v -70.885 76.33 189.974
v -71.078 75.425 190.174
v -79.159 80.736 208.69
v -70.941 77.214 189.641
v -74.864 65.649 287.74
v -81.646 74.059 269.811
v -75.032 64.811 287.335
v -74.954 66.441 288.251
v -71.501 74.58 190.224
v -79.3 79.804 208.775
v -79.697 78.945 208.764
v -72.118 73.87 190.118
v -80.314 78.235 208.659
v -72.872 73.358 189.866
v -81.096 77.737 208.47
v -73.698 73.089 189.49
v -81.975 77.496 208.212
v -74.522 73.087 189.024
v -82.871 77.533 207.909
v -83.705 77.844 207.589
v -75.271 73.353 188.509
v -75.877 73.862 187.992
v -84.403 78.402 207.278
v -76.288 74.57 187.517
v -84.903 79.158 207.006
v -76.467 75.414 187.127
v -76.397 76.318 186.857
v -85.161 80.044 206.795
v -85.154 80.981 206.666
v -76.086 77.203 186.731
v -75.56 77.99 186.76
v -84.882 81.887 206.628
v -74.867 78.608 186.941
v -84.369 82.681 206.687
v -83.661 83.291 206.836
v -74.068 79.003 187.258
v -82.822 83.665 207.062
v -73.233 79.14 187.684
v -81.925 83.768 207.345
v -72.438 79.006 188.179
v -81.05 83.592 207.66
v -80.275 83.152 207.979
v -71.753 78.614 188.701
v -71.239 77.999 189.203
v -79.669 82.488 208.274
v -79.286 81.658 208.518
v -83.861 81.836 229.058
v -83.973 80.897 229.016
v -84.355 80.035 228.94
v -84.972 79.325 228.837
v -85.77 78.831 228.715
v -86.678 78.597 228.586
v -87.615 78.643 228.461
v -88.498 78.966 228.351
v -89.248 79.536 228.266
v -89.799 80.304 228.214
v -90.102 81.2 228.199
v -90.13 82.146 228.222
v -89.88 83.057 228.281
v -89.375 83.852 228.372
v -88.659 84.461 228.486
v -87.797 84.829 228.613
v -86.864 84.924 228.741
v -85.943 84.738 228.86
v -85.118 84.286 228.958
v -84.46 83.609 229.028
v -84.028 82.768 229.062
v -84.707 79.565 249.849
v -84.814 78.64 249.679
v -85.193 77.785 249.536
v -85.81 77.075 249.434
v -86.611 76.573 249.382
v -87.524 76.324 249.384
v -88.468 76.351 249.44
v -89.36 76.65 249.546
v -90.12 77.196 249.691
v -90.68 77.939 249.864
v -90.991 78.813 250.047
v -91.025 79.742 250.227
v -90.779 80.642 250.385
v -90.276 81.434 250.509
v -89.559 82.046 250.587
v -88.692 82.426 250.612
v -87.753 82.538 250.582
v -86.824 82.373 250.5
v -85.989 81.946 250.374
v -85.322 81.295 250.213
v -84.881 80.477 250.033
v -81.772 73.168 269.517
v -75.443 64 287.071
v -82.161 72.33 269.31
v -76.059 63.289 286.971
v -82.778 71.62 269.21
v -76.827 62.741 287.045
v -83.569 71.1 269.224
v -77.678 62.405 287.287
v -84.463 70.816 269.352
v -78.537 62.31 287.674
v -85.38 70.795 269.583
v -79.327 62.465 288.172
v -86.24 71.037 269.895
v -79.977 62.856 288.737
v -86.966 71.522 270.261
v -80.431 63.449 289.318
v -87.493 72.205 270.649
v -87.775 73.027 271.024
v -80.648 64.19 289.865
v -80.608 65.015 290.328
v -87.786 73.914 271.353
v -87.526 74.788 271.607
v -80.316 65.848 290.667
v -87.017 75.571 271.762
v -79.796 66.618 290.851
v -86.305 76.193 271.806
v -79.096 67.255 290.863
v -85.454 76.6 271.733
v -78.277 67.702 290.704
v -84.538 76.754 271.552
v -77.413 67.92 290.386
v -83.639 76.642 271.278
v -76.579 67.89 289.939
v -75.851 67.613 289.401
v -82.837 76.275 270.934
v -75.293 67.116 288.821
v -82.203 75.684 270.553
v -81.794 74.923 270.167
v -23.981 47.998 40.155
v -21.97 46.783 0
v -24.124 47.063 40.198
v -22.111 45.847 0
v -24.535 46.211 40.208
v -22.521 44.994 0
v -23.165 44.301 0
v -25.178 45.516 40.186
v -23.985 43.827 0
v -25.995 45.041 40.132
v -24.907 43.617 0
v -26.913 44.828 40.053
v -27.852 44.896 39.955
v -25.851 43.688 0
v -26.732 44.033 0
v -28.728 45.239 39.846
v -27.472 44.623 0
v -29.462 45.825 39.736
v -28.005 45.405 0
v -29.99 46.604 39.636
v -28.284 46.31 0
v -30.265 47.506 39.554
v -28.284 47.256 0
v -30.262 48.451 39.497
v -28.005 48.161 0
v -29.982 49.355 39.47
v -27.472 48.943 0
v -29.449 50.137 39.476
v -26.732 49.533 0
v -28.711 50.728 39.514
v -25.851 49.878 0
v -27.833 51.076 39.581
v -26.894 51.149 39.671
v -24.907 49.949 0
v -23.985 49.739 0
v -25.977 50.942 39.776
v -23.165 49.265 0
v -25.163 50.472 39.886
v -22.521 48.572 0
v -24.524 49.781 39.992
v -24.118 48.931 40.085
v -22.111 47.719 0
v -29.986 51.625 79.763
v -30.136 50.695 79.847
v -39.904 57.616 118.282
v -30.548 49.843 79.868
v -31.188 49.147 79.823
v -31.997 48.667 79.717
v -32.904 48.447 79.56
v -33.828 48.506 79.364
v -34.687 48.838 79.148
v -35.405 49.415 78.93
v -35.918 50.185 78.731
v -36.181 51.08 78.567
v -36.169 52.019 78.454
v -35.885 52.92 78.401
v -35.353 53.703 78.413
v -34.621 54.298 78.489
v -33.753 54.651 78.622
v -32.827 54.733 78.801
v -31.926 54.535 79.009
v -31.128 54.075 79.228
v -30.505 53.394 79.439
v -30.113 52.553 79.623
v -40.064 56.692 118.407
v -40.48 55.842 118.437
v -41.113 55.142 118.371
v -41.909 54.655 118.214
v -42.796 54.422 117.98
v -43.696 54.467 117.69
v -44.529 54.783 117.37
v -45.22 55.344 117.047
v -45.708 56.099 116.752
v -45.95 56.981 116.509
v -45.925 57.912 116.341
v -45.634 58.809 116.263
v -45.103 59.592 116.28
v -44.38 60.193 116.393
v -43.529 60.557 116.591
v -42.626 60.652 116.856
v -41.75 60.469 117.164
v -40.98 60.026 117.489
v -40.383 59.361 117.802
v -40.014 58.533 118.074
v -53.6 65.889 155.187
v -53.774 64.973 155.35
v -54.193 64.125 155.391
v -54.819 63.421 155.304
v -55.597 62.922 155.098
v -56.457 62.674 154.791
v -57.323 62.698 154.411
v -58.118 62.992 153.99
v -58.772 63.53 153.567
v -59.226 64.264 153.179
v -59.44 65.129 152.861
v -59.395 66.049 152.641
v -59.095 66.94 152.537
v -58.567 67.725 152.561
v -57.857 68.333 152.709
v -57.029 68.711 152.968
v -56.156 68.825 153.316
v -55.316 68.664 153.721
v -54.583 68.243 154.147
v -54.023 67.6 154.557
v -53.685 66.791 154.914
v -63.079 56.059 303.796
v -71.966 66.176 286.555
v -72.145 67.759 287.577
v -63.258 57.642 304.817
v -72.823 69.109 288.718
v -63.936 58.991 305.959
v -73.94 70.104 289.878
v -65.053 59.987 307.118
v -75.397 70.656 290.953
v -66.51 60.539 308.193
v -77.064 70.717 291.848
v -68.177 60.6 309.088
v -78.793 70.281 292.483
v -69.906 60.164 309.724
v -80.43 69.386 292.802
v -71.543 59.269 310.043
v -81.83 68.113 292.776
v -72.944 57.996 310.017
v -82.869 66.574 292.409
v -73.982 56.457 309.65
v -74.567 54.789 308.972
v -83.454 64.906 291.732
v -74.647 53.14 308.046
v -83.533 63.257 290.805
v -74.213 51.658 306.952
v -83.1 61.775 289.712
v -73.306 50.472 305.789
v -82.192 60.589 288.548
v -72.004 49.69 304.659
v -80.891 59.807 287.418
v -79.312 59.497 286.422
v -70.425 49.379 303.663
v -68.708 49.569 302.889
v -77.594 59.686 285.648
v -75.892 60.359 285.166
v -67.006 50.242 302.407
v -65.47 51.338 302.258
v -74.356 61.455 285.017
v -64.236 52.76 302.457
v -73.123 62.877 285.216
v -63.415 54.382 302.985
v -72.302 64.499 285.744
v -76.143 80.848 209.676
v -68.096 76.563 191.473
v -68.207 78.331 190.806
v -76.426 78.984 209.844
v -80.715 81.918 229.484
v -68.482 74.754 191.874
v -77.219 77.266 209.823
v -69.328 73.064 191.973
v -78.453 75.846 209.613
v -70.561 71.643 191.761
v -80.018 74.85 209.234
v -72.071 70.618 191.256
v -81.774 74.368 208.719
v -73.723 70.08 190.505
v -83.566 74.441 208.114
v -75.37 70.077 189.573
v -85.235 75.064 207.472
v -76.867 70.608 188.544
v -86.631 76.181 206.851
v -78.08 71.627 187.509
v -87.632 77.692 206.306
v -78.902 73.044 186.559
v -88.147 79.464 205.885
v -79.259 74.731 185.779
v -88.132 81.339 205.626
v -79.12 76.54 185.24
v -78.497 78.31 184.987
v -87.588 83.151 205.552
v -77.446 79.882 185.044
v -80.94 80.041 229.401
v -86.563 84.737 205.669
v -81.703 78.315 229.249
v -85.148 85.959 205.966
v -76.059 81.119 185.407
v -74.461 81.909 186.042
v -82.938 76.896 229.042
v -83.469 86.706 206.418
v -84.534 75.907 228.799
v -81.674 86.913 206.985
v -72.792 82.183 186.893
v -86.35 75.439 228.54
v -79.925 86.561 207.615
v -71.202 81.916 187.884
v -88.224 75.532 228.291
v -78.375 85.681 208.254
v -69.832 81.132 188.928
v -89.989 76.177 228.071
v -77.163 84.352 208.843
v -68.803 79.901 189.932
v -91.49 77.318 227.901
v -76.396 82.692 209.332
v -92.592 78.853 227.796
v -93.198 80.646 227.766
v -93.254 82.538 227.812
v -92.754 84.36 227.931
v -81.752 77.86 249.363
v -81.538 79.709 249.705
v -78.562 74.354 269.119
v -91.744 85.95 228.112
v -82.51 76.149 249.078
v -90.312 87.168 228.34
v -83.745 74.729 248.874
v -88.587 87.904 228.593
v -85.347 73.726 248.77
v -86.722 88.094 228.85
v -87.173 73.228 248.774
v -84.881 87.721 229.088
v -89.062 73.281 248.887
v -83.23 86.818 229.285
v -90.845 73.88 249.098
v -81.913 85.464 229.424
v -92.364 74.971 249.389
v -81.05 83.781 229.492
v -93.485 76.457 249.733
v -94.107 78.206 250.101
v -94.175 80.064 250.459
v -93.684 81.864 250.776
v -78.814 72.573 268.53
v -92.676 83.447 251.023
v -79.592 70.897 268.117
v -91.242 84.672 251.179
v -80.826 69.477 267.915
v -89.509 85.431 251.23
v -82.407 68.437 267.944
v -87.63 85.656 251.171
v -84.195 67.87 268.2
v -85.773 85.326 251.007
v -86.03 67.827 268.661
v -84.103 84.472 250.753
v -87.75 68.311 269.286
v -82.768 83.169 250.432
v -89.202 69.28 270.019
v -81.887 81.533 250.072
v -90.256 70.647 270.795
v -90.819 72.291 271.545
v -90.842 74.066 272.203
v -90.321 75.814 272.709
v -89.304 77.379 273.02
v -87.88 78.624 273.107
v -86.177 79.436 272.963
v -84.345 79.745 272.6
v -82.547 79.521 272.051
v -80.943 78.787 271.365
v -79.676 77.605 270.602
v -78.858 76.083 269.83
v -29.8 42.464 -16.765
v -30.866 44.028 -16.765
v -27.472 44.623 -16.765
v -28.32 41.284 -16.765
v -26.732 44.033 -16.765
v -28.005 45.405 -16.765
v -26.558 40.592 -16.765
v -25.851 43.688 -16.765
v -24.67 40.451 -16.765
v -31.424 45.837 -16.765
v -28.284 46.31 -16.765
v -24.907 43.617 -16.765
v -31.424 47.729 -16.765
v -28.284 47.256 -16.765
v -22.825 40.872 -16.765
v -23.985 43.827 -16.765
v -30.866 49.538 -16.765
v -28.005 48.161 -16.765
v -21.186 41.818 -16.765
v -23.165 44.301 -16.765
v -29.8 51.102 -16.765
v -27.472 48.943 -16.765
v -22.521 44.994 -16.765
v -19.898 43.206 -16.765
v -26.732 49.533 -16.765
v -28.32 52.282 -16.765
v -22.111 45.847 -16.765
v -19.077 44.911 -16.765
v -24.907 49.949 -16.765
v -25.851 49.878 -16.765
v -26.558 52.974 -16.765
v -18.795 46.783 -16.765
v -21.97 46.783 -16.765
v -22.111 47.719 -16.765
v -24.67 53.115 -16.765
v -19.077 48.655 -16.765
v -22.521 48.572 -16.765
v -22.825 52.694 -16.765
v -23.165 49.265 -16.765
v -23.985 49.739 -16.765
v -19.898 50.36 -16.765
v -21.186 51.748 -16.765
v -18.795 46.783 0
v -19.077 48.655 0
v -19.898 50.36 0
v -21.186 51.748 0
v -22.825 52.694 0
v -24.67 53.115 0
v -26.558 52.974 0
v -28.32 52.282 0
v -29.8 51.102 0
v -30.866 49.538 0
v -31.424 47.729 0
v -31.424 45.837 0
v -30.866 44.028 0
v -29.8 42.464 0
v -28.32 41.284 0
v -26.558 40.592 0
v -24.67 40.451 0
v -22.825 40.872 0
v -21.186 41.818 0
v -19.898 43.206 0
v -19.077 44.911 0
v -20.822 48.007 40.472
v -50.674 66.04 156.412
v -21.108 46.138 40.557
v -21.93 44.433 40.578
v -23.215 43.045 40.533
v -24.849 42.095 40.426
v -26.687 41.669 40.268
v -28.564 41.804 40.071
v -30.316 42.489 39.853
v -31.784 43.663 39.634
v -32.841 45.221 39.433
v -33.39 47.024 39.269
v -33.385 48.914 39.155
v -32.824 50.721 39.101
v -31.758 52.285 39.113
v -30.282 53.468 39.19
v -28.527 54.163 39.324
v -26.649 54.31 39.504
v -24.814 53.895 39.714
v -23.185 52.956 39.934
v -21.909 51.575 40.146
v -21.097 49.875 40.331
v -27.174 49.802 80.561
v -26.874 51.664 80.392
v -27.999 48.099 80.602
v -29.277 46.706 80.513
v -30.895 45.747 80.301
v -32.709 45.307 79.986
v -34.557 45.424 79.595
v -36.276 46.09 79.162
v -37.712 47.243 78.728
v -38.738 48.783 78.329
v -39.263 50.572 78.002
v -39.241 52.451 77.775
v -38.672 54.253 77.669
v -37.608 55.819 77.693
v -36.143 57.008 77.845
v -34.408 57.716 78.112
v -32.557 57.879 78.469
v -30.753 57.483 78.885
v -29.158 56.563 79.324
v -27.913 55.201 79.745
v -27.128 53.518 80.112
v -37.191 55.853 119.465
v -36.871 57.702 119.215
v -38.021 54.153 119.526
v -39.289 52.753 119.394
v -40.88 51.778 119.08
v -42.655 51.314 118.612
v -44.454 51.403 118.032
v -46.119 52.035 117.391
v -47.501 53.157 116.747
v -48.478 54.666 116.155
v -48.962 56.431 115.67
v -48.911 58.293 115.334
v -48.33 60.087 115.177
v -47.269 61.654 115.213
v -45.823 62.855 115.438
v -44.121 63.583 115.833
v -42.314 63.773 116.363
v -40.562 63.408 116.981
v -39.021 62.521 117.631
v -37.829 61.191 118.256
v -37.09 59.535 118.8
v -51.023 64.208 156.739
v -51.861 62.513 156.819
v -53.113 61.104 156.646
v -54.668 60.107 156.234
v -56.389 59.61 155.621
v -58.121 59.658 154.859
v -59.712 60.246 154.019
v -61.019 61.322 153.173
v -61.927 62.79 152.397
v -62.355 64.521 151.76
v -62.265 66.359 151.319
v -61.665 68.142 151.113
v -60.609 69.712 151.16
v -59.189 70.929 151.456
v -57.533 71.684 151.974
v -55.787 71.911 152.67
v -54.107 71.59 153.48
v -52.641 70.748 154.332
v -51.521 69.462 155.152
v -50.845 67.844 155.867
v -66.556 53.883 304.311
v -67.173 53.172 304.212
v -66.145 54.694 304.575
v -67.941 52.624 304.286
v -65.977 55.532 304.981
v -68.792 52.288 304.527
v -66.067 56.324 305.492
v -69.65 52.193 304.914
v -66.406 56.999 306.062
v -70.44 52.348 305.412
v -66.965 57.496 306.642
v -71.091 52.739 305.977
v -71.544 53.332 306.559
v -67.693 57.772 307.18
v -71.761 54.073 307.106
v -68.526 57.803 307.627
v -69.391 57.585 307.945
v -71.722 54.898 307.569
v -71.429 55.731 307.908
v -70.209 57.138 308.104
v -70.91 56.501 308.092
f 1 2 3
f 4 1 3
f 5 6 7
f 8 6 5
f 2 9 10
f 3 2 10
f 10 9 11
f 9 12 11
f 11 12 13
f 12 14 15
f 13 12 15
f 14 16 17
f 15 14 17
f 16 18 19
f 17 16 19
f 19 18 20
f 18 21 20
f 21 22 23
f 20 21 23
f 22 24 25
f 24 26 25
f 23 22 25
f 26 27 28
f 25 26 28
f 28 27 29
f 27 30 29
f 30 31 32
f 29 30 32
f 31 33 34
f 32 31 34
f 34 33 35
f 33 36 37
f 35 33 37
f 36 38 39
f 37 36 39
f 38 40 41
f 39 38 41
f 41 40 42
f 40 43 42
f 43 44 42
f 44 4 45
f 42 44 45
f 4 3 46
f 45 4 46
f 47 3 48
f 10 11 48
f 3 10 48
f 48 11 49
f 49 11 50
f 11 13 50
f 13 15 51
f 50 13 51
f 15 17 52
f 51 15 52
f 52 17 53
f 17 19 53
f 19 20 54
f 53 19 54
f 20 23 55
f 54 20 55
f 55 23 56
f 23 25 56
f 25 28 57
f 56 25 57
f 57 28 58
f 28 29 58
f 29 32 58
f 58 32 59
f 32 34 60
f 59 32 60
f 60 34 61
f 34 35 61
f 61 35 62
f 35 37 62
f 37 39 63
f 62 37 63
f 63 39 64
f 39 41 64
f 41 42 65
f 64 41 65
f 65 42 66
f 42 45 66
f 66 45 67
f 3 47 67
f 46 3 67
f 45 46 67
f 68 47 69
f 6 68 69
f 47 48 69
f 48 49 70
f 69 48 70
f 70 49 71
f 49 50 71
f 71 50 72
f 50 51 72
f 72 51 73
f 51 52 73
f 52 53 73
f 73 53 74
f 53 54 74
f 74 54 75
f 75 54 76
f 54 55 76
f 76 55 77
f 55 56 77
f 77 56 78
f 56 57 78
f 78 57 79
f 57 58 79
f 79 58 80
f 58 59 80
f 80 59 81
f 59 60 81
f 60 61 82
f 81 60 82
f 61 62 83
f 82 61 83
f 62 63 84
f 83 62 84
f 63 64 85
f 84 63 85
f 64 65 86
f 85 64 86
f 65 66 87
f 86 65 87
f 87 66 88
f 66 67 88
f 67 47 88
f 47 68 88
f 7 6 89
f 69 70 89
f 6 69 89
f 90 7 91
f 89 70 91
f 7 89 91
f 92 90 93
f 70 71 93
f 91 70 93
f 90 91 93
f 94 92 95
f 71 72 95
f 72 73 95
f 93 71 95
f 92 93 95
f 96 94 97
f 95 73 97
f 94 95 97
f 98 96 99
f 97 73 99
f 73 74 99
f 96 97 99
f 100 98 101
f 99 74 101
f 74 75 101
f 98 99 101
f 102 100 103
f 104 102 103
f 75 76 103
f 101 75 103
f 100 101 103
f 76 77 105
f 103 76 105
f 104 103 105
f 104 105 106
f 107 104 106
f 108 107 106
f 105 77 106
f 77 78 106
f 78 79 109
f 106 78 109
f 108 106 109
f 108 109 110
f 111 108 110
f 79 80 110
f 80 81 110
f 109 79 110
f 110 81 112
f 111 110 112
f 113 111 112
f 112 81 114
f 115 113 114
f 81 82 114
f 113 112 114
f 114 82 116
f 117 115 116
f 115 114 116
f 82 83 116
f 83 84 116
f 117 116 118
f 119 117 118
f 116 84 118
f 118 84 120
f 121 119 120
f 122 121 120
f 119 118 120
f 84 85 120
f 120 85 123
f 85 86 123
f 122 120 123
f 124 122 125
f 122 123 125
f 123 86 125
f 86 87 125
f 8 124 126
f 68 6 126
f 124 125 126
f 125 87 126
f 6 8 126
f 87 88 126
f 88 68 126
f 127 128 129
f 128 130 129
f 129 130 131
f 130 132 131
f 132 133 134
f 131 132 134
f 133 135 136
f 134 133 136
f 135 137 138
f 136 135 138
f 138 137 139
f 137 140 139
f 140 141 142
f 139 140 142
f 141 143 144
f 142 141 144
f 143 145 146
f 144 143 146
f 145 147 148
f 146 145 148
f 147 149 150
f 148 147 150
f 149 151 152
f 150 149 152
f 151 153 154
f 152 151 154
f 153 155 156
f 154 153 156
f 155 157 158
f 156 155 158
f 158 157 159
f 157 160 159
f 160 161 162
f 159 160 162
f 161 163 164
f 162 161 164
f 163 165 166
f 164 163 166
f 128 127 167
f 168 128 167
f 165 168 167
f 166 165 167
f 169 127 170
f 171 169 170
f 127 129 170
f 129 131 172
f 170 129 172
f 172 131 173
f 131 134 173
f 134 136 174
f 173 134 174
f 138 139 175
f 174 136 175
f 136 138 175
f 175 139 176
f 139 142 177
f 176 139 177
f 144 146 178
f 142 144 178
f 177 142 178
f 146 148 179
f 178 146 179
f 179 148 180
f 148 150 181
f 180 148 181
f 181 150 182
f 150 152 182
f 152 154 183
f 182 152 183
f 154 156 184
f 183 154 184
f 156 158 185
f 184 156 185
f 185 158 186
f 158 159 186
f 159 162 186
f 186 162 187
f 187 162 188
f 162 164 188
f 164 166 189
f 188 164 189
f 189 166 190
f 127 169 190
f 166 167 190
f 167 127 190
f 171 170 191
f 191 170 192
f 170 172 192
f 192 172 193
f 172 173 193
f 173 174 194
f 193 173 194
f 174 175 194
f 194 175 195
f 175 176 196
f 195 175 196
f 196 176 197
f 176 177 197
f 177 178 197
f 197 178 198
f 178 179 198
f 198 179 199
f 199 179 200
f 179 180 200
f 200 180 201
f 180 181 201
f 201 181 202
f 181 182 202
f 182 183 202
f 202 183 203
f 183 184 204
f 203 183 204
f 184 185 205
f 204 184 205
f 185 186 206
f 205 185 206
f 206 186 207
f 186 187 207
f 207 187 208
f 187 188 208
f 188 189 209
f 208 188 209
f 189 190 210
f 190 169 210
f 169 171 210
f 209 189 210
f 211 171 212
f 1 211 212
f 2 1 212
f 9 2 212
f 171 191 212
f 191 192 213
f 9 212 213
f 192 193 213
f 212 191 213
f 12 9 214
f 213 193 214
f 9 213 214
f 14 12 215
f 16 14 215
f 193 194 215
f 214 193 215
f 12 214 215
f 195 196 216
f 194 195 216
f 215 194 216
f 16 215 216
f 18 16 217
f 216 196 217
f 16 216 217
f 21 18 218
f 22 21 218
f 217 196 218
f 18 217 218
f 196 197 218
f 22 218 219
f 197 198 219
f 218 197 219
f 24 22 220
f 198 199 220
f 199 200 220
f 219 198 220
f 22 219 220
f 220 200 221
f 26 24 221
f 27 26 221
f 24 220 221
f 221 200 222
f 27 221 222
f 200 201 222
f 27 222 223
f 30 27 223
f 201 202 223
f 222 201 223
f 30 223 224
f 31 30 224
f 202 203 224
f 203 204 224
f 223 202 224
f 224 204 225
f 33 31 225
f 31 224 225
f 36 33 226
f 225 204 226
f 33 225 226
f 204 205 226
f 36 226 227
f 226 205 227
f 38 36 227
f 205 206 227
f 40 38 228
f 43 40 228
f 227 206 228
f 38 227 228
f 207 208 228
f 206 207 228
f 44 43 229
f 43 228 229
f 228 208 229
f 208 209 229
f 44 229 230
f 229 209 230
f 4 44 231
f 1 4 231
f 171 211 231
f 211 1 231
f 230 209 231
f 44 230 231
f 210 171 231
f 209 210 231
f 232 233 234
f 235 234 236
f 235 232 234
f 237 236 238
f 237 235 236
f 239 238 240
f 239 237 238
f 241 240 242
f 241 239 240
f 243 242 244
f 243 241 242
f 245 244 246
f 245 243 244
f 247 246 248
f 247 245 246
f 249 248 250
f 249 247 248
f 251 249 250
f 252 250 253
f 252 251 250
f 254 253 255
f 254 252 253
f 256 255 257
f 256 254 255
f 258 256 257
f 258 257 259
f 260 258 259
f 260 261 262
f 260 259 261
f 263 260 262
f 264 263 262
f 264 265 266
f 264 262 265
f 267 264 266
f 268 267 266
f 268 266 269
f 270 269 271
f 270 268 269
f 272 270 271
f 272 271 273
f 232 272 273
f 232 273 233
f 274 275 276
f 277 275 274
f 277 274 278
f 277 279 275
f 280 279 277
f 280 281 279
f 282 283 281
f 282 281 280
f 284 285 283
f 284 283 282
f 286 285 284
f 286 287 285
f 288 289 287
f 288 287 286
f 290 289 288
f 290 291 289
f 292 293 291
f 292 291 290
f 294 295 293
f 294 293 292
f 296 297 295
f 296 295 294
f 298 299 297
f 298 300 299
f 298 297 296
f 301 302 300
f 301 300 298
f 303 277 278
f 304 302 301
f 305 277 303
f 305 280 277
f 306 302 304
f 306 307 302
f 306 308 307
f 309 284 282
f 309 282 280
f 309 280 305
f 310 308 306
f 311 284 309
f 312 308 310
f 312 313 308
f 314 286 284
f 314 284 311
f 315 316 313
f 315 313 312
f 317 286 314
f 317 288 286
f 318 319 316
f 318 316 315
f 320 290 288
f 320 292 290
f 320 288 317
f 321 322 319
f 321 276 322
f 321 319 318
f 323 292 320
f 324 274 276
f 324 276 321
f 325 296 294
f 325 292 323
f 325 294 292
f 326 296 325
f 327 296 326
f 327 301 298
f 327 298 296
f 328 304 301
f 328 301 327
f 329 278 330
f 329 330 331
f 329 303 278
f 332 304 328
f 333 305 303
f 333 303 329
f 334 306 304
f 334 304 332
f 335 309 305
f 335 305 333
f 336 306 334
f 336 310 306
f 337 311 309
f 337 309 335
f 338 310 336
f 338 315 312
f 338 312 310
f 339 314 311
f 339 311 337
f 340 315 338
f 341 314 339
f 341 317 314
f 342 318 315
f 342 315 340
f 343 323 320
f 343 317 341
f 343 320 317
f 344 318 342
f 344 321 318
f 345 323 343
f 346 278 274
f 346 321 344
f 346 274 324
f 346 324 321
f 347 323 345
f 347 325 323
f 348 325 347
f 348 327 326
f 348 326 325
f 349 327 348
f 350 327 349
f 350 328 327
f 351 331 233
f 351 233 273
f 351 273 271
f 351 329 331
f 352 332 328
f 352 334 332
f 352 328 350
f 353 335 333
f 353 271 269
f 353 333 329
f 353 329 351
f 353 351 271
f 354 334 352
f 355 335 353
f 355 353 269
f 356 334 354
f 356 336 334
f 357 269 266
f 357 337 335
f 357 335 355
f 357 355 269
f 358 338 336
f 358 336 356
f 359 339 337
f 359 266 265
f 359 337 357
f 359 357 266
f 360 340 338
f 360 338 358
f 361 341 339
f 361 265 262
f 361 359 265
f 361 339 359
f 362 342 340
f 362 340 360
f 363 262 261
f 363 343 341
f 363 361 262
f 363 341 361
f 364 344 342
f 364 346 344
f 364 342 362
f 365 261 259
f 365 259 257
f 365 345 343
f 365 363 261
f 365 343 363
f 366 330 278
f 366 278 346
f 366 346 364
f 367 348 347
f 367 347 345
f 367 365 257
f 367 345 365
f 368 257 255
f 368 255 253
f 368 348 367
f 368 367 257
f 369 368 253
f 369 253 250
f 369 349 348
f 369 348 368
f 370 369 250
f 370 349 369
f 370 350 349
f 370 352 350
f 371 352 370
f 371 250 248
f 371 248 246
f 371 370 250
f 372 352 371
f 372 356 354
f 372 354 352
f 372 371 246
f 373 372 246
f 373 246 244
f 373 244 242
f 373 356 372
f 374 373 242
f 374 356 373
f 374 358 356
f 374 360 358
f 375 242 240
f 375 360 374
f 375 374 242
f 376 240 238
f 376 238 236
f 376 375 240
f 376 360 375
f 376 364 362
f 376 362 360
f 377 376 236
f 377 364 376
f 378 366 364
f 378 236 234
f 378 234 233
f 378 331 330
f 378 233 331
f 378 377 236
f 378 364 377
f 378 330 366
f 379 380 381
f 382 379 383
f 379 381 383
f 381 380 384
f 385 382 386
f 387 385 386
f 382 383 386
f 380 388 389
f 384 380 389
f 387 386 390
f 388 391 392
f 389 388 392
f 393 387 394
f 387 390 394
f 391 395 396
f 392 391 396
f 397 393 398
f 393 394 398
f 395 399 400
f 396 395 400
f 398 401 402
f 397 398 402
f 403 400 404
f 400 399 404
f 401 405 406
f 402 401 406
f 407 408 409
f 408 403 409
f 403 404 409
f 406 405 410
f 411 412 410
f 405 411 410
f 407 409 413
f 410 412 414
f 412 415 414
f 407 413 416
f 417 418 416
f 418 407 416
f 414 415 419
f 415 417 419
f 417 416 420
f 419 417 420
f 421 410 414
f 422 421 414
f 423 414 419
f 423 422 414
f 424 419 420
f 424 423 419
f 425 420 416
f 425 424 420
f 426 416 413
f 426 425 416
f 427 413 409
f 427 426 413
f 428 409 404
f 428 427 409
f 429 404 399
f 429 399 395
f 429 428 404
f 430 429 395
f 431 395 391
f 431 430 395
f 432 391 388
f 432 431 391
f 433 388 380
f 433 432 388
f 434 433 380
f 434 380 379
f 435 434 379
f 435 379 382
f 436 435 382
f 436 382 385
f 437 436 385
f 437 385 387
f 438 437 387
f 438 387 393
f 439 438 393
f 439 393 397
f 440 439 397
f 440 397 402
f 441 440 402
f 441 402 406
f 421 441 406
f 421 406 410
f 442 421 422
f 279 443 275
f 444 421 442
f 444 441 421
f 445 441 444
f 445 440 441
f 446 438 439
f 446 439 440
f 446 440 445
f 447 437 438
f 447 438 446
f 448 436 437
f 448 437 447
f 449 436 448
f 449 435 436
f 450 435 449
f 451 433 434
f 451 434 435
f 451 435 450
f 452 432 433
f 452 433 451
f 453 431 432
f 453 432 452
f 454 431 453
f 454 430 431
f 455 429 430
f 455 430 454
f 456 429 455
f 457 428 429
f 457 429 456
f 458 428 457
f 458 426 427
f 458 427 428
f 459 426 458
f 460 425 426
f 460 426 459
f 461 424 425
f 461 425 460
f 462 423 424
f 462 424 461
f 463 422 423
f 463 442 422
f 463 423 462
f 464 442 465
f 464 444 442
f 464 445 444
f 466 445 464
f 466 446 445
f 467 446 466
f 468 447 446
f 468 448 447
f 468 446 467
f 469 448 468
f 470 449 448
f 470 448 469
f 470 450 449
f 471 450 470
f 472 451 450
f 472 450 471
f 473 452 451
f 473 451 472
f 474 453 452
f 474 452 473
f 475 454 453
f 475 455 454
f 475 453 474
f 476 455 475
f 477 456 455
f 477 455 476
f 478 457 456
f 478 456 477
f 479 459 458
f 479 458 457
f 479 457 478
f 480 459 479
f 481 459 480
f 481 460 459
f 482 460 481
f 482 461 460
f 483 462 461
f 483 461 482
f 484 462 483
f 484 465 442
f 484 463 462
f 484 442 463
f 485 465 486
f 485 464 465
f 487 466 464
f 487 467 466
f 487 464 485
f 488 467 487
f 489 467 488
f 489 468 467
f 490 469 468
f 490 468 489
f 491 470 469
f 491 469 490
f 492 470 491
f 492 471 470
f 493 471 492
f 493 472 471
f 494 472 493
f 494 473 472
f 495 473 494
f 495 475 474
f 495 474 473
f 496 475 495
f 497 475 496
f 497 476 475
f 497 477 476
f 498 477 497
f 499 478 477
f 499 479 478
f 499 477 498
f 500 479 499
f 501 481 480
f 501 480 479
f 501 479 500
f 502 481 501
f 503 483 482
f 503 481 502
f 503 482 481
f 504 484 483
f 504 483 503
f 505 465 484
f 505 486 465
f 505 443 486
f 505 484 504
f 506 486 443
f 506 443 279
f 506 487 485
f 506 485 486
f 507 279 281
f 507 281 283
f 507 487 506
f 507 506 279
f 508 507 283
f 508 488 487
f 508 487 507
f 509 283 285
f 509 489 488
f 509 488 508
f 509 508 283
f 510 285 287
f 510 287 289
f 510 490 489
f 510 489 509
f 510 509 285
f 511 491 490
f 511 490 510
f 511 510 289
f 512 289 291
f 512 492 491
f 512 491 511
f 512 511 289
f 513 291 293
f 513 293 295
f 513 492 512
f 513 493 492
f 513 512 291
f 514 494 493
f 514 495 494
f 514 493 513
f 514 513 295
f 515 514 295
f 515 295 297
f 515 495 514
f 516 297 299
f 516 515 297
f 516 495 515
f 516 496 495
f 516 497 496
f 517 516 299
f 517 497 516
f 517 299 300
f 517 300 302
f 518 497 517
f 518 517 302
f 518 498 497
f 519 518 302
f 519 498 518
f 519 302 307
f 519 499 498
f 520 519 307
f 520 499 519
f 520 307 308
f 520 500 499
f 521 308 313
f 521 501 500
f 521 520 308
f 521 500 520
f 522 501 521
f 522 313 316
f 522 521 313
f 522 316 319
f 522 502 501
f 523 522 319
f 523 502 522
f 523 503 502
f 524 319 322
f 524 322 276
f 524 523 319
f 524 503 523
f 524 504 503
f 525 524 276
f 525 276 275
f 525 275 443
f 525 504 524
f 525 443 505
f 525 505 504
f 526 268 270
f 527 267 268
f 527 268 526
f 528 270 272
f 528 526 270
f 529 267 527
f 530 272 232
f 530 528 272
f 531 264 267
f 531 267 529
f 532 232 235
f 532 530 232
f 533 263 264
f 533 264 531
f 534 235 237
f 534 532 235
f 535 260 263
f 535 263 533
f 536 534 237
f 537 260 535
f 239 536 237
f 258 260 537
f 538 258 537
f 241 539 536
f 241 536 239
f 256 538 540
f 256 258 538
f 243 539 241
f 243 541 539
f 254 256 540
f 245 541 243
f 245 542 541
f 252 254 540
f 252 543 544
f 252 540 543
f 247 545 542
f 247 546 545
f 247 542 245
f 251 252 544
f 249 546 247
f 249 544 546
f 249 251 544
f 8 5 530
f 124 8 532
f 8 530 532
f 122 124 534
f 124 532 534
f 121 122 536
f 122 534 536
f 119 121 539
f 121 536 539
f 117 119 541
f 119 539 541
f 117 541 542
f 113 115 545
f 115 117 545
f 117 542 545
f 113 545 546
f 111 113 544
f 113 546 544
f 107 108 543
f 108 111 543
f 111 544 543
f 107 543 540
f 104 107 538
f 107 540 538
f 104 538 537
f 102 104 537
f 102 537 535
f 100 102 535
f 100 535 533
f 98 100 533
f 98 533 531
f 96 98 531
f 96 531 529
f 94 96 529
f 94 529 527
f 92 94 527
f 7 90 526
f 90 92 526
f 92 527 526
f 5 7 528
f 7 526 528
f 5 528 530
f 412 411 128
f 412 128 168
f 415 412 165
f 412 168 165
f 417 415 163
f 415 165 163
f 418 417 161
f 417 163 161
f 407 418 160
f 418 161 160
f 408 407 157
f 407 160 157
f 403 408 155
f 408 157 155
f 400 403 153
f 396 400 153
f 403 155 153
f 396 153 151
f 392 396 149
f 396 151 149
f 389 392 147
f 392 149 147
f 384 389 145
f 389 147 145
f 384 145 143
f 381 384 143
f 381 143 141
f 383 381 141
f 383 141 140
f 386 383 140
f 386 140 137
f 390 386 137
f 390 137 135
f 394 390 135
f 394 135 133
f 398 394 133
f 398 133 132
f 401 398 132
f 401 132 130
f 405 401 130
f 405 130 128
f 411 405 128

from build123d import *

# Parameters (mm, degrees)
SWEEP1_PROFILE_R     = 6.35
CUT_SWEEP1_PROFILE_R = 3.175


with BuildPart() as part:
    # Sweep1: sweep along a curve in space
    with BuildLine() as sweep1_path:
        Line((-25.144717139, 46.783, -16.764999998), (-25.144717139, 46.783, 0))
        ThreePointArc((-25.144717139, 46.783, 0), (-37.539812947, 54.270144781, 98.408776247), (-73.67428039, 76.09684088, 188.474744178))
        ThreePointArc((-77.762208871, 65.122942343, 288.925037219), (-87.944554744, 81.01650581, 239.339220312), (-73.67428039, 76.09684088, 188.474744178))
        Line((-68.87554044, 55.005914395, 306.16579471), (-77.762208871, 65.122942343, 288.925037219))
    # Sweep1 profile (on start of the path) → Sweep1 (sweep)
    with BuildSketch(Plane(origin=(-25.144717139, 46.783, -16.764999998), x_dir=(1, 0, 0), z_dir=(0, 0, 1))):
        Circle(SWEEP1_PROFILE_R)
    sweep(path=sweep1_path.line)

    # Cut-Sweep1: sweep along a curve in space
    with BuildLine() as cut_sweep1_path:
        Line((-25.144717139, 46.783, -16.764999998), (-25.144717139, 46.783, 0))
        ThreePointArc((-25.144717139, 46.783, 0), (-37.539812947, 54.270144781, 98.408776247), (-73.67428039, 76.09684088, 188.474744178))
        ThreePointArc((-77.762208871, 65.122942343, 288.925037219), (-87.944554744, 81.01650581, 239.339220312), (-73.67428039, 76.09684088, 188.474744178))
        Line((-68.87554044, 55.005914395, 306.16579471), (-77.762208871, 65.122942343, 288.925037219))
    # Cut-Sweep1 profile (on start of the path) → Cut-Sweep1 (sweep, cut)
    with BuildSketch(Plane(origin=(-25.144717139, 46.783, -16.764999998), x_dir=(1, 0, 0), z_dir=(0, 0, 1))):
        Circle(CUT_SWEEP1_PROFILE_R)
    sweep(path=cut_sweep1_path.line, mode=Mode.SUBTRACT)


solid = part.part
